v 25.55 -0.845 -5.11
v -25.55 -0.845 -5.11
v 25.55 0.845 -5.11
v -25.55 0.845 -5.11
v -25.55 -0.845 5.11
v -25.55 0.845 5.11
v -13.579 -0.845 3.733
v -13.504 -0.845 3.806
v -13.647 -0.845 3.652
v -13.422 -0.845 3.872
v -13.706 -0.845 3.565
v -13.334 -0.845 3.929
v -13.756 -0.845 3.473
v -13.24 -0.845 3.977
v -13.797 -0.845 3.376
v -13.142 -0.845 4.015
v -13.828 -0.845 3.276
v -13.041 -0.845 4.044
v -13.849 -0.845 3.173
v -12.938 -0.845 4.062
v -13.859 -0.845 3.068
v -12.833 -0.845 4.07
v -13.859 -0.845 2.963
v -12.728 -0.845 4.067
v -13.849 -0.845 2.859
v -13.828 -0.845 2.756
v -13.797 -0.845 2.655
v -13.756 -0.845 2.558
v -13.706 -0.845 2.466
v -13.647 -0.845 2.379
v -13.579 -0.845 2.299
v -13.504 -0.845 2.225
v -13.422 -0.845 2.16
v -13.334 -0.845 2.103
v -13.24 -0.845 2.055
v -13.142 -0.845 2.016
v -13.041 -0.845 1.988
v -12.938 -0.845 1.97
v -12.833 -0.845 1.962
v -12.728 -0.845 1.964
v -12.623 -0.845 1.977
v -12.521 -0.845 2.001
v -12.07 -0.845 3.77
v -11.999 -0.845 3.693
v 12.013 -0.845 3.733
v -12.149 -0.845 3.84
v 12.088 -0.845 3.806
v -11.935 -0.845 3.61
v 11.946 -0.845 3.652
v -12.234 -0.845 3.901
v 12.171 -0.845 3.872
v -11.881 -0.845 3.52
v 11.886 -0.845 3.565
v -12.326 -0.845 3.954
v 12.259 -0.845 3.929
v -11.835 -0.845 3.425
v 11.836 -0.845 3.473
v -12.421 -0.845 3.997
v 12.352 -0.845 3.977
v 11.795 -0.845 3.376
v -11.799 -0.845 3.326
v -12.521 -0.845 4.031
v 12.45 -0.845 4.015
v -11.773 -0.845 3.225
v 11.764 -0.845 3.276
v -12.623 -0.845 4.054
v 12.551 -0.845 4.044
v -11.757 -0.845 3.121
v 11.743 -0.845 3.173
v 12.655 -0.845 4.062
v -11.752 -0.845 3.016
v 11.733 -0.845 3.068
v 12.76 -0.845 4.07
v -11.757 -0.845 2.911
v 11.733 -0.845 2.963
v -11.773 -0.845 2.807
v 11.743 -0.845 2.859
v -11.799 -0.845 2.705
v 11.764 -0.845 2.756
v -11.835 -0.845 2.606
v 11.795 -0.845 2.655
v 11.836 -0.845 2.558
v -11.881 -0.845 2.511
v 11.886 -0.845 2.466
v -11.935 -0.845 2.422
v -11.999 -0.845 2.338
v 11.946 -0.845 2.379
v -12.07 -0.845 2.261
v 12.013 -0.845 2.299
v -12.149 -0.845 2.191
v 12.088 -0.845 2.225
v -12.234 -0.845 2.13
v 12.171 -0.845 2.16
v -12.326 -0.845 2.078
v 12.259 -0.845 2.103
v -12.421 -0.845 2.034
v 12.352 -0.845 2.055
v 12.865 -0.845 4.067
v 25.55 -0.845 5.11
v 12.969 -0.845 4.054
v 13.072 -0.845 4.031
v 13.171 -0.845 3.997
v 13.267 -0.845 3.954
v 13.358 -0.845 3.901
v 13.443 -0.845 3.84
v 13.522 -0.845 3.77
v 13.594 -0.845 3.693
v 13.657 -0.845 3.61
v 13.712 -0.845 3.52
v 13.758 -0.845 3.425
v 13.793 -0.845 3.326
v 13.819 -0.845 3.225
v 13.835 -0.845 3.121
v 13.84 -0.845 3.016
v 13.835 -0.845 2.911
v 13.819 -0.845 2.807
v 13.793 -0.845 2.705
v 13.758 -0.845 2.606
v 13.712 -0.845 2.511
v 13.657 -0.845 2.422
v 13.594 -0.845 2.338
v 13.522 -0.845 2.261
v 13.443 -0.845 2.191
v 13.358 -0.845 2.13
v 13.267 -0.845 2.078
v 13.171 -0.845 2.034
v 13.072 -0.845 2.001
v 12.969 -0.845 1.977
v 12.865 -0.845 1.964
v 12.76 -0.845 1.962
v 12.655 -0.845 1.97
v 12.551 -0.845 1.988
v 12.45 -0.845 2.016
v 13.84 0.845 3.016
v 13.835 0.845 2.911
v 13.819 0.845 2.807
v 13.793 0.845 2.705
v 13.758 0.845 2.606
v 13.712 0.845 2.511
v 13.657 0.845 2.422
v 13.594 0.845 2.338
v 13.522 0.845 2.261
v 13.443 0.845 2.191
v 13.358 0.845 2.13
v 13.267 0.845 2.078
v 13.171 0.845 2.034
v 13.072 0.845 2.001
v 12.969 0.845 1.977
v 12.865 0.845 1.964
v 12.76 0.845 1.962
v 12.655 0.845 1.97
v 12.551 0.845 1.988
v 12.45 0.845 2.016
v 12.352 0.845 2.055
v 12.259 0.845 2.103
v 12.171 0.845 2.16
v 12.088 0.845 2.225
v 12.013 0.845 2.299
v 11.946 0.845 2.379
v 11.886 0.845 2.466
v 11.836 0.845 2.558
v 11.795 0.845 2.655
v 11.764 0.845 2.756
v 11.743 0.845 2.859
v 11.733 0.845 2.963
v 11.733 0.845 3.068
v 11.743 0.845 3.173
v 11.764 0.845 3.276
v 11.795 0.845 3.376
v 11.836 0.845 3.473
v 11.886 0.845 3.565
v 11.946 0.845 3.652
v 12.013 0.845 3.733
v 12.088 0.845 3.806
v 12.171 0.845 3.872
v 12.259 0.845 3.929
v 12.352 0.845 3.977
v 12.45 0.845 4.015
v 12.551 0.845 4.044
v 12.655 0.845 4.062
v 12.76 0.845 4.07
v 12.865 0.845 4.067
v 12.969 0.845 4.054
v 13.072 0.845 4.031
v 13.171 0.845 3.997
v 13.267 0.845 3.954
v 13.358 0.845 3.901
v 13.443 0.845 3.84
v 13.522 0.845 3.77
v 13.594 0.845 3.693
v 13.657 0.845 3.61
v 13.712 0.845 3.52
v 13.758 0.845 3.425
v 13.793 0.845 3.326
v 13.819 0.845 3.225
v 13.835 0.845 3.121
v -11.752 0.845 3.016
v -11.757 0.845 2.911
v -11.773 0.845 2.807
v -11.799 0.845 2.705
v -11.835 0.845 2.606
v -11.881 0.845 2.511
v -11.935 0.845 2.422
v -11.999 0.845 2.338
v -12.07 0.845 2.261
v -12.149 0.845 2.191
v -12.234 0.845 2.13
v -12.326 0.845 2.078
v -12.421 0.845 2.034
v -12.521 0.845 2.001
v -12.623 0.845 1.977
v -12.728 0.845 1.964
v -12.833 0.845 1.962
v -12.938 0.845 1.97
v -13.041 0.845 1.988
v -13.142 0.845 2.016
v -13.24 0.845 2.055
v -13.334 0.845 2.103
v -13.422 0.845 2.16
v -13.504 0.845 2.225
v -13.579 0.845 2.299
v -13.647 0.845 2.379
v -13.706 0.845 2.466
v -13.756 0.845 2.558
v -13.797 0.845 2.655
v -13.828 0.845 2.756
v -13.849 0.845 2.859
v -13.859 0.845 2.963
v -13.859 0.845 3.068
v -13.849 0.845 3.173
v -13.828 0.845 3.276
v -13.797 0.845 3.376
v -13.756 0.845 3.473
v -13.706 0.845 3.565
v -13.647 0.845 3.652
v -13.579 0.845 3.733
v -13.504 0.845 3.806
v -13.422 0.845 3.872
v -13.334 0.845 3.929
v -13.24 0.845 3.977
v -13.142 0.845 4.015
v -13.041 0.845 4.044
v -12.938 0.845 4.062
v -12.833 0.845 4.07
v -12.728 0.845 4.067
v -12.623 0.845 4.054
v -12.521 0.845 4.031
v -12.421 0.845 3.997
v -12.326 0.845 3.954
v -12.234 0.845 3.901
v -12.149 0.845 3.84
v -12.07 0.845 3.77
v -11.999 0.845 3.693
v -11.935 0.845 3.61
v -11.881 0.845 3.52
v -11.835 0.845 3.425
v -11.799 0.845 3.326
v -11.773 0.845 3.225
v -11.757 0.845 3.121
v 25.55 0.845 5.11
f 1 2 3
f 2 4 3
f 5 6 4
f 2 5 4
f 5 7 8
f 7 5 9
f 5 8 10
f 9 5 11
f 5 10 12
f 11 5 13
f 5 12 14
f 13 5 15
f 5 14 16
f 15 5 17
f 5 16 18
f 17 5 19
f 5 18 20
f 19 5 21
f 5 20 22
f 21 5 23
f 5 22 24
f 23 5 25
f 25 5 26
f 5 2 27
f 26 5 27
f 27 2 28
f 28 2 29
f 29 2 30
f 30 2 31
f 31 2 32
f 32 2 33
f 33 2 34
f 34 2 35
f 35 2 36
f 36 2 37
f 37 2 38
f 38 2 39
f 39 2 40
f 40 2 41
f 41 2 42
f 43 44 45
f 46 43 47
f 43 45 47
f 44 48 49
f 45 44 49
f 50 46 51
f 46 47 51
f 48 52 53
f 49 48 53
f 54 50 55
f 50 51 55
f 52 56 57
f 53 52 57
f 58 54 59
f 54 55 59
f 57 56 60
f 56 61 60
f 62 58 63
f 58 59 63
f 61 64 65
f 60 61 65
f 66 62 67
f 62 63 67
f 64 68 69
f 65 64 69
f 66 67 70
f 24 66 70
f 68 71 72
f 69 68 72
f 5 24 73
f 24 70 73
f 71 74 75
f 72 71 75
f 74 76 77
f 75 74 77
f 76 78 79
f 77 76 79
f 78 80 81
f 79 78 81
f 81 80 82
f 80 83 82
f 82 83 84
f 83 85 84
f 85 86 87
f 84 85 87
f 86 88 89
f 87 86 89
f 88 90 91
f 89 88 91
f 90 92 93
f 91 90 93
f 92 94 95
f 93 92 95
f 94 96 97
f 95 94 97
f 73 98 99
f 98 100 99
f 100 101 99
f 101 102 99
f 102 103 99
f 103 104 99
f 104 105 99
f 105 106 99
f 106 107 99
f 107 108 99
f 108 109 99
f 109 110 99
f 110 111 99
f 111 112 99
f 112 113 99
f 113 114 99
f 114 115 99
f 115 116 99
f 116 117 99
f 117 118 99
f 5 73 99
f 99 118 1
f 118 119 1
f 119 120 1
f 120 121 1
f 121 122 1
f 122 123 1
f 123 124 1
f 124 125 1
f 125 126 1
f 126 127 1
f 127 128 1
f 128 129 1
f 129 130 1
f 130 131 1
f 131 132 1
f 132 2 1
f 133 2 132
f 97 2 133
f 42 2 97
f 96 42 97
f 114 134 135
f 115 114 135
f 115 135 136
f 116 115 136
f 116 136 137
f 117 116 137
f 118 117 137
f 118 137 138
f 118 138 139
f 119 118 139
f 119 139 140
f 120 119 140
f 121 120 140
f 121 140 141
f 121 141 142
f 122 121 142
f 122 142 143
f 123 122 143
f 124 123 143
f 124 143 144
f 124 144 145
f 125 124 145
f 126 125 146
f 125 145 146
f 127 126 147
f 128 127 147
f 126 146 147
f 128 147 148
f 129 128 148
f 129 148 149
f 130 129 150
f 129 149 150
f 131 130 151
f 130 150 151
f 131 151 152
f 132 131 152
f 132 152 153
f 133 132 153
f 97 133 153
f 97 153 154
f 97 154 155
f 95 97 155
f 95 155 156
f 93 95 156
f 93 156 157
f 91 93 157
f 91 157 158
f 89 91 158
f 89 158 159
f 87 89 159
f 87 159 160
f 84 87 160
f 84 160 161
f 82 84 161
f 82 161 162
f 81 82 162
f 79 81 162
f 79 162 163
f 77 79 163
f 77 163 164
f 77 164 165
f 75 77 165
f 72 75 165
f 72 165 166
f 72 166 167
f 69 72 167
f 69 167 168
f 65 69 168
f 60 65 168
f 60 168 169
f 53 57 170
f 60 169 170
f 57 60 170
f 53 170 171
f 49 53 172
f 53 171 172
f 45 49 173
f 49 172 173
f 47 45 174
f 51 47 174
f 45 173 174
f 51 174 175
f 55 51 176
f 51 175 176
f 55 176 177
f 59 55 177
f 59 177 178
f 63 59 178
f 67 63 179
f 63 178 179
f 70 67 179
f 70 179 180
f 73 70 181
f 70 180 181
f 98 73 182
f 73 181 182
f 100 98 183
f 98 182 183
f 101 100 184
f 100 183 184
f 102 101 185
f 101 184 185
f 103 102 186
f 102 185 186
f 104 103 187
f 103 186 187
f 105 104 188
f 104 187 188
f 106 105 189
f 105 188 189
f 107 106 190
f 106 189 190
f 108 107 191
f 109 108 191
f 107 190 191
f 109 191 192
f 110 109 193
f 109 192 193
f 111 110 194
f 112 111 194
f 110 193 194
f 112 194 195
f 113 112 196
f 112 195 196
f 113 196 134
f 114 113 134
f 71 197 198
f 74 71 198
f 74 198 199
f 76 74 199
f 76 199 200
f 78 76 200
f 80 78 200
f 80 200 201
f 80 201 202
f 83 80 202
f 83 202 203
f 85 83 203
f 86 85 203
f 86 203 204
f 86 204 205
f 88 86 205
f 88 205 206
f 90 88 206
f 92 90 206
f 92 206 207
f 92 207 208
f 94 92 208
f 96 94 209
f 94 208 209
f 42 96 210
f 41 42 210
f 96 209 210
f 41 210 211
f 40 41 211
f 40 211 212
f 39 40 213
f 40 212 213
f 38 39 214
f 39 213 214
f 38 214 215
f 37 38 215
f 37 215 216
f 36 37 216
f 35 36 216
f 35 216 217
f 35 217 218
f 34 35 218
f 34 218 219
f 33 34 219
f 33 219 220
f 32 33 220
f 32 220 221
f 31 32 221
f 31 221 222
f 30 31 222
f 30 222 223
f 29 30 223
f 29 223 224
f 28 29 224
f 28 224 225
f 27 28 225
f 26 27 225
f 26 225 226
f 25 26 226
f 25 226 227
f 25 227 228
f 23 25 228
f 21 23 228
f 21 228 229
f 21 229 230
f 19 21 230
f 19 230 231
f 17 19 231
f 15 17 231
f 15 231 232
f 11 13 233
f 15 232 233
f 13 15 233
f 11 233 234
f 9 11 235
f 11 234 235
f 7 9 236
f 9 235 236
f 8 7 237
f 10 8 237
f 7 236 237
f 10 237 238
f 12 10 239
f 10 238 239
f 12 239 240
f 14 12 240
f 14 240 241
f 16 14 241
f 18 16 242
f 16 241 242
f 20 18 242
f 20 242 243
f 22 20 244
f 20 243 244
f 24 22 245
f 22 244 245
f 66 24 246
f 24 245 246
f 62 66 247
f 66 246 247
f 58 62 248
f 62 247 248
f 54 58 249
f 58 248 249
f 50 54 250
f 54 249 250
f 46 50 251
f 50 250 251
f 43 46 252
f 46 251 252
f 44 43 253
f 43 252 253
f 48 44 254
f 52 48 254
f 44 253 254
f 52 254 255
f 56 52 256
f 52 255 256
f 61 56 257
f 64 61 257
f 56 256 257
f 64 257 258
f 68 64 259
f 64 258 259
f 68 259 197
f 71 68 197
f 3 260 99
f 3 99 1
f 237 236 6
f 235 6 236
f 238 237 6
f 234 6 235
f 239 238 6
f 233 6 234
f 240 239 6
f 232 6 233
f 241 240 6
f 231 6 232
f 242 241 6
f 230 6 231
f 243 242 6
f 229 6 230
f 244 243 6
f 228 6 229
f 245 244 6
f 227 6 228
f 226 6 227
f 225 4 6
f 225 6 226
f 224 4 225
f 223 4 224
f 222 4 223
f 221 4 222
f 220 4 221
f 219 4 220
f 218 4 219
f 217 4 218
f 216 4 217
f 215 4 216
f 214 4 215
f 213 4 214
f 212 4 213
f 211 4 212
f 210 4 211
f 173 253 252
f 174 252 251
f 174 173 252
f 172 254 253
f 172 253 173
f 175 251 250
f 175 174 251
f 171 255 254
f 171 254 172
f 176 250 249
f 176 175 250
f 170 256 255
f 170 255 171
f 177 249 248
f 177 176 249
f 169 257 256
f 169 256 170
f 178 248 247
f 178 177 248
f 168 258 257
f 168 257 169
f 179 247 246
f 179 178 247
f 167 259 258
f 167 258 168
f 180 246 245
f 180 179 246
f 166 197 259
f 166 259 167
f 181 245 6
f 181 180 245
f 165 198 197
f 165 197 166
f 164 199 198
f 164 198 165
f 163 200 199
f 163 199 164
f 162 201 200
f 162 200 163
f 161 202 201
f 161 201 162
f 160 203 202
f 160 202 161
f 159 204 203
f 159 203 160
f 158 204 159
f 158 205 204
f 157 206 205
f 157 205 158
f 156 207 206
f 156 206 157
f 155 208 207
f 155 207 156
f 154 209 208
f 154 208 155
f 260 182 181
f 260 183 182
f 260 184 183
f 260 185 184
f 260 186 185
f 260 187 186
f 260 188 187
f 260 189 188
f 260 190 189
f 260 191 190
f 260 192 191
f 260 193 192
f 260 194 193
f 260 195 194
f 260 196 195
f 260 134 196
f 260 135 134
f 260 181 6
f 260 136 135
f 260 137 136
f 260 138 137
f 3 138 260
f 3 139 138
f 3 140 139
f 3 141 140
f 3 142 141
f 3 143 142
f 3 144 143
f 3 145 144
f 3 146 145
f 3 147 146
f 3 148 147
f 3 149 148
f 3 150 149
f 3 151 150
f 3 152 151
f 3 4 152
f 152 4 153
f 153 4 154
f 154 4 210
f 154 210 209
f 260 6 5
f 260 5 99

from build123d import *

# Parameters (mm, degrees)
SKETCH1_W           = 51.1
SKETCH1_H           = 10.22
BOSS_EXTRUDE1_DEPTH = 0.845
SKETCH2_R           = 1.054294776
CUT_EXTRUDE1_DEPTH  = 2.69


with BuildPart() as part:
    # Sketch1 → Boss-Extrude1 (new body, symmetric)
    with BuildSketch(Plane(origin=(0, 0, 0), x_dir=(1, 0, 0), z_dir=(0, 1, 0))):
        Rectangle(SKETCH1_W, SKETCH1_H)
    extrude(amount=BOSS_EXTRUDE1_DEPTH, both=True)

    # Sketch2 → Cut-Extrude1 (cut, through all)
    with BuildSketch(Plane(origin=(0, 0.845, 0), x_dir=(1, 0, 0), z_dir=(0, 1, 0))):
        with Locations((-12.806496192, -3.015690418)):
            Circle(SKETCH2_R)
        with Locations((12.785993514, -3.015690418)):
            Circle(SKETCH2_R)
    extrude(amount=-CUT_EXTRUDE1_DEPTH, mode=Mode.SUBTRACT)


solid = part.part
